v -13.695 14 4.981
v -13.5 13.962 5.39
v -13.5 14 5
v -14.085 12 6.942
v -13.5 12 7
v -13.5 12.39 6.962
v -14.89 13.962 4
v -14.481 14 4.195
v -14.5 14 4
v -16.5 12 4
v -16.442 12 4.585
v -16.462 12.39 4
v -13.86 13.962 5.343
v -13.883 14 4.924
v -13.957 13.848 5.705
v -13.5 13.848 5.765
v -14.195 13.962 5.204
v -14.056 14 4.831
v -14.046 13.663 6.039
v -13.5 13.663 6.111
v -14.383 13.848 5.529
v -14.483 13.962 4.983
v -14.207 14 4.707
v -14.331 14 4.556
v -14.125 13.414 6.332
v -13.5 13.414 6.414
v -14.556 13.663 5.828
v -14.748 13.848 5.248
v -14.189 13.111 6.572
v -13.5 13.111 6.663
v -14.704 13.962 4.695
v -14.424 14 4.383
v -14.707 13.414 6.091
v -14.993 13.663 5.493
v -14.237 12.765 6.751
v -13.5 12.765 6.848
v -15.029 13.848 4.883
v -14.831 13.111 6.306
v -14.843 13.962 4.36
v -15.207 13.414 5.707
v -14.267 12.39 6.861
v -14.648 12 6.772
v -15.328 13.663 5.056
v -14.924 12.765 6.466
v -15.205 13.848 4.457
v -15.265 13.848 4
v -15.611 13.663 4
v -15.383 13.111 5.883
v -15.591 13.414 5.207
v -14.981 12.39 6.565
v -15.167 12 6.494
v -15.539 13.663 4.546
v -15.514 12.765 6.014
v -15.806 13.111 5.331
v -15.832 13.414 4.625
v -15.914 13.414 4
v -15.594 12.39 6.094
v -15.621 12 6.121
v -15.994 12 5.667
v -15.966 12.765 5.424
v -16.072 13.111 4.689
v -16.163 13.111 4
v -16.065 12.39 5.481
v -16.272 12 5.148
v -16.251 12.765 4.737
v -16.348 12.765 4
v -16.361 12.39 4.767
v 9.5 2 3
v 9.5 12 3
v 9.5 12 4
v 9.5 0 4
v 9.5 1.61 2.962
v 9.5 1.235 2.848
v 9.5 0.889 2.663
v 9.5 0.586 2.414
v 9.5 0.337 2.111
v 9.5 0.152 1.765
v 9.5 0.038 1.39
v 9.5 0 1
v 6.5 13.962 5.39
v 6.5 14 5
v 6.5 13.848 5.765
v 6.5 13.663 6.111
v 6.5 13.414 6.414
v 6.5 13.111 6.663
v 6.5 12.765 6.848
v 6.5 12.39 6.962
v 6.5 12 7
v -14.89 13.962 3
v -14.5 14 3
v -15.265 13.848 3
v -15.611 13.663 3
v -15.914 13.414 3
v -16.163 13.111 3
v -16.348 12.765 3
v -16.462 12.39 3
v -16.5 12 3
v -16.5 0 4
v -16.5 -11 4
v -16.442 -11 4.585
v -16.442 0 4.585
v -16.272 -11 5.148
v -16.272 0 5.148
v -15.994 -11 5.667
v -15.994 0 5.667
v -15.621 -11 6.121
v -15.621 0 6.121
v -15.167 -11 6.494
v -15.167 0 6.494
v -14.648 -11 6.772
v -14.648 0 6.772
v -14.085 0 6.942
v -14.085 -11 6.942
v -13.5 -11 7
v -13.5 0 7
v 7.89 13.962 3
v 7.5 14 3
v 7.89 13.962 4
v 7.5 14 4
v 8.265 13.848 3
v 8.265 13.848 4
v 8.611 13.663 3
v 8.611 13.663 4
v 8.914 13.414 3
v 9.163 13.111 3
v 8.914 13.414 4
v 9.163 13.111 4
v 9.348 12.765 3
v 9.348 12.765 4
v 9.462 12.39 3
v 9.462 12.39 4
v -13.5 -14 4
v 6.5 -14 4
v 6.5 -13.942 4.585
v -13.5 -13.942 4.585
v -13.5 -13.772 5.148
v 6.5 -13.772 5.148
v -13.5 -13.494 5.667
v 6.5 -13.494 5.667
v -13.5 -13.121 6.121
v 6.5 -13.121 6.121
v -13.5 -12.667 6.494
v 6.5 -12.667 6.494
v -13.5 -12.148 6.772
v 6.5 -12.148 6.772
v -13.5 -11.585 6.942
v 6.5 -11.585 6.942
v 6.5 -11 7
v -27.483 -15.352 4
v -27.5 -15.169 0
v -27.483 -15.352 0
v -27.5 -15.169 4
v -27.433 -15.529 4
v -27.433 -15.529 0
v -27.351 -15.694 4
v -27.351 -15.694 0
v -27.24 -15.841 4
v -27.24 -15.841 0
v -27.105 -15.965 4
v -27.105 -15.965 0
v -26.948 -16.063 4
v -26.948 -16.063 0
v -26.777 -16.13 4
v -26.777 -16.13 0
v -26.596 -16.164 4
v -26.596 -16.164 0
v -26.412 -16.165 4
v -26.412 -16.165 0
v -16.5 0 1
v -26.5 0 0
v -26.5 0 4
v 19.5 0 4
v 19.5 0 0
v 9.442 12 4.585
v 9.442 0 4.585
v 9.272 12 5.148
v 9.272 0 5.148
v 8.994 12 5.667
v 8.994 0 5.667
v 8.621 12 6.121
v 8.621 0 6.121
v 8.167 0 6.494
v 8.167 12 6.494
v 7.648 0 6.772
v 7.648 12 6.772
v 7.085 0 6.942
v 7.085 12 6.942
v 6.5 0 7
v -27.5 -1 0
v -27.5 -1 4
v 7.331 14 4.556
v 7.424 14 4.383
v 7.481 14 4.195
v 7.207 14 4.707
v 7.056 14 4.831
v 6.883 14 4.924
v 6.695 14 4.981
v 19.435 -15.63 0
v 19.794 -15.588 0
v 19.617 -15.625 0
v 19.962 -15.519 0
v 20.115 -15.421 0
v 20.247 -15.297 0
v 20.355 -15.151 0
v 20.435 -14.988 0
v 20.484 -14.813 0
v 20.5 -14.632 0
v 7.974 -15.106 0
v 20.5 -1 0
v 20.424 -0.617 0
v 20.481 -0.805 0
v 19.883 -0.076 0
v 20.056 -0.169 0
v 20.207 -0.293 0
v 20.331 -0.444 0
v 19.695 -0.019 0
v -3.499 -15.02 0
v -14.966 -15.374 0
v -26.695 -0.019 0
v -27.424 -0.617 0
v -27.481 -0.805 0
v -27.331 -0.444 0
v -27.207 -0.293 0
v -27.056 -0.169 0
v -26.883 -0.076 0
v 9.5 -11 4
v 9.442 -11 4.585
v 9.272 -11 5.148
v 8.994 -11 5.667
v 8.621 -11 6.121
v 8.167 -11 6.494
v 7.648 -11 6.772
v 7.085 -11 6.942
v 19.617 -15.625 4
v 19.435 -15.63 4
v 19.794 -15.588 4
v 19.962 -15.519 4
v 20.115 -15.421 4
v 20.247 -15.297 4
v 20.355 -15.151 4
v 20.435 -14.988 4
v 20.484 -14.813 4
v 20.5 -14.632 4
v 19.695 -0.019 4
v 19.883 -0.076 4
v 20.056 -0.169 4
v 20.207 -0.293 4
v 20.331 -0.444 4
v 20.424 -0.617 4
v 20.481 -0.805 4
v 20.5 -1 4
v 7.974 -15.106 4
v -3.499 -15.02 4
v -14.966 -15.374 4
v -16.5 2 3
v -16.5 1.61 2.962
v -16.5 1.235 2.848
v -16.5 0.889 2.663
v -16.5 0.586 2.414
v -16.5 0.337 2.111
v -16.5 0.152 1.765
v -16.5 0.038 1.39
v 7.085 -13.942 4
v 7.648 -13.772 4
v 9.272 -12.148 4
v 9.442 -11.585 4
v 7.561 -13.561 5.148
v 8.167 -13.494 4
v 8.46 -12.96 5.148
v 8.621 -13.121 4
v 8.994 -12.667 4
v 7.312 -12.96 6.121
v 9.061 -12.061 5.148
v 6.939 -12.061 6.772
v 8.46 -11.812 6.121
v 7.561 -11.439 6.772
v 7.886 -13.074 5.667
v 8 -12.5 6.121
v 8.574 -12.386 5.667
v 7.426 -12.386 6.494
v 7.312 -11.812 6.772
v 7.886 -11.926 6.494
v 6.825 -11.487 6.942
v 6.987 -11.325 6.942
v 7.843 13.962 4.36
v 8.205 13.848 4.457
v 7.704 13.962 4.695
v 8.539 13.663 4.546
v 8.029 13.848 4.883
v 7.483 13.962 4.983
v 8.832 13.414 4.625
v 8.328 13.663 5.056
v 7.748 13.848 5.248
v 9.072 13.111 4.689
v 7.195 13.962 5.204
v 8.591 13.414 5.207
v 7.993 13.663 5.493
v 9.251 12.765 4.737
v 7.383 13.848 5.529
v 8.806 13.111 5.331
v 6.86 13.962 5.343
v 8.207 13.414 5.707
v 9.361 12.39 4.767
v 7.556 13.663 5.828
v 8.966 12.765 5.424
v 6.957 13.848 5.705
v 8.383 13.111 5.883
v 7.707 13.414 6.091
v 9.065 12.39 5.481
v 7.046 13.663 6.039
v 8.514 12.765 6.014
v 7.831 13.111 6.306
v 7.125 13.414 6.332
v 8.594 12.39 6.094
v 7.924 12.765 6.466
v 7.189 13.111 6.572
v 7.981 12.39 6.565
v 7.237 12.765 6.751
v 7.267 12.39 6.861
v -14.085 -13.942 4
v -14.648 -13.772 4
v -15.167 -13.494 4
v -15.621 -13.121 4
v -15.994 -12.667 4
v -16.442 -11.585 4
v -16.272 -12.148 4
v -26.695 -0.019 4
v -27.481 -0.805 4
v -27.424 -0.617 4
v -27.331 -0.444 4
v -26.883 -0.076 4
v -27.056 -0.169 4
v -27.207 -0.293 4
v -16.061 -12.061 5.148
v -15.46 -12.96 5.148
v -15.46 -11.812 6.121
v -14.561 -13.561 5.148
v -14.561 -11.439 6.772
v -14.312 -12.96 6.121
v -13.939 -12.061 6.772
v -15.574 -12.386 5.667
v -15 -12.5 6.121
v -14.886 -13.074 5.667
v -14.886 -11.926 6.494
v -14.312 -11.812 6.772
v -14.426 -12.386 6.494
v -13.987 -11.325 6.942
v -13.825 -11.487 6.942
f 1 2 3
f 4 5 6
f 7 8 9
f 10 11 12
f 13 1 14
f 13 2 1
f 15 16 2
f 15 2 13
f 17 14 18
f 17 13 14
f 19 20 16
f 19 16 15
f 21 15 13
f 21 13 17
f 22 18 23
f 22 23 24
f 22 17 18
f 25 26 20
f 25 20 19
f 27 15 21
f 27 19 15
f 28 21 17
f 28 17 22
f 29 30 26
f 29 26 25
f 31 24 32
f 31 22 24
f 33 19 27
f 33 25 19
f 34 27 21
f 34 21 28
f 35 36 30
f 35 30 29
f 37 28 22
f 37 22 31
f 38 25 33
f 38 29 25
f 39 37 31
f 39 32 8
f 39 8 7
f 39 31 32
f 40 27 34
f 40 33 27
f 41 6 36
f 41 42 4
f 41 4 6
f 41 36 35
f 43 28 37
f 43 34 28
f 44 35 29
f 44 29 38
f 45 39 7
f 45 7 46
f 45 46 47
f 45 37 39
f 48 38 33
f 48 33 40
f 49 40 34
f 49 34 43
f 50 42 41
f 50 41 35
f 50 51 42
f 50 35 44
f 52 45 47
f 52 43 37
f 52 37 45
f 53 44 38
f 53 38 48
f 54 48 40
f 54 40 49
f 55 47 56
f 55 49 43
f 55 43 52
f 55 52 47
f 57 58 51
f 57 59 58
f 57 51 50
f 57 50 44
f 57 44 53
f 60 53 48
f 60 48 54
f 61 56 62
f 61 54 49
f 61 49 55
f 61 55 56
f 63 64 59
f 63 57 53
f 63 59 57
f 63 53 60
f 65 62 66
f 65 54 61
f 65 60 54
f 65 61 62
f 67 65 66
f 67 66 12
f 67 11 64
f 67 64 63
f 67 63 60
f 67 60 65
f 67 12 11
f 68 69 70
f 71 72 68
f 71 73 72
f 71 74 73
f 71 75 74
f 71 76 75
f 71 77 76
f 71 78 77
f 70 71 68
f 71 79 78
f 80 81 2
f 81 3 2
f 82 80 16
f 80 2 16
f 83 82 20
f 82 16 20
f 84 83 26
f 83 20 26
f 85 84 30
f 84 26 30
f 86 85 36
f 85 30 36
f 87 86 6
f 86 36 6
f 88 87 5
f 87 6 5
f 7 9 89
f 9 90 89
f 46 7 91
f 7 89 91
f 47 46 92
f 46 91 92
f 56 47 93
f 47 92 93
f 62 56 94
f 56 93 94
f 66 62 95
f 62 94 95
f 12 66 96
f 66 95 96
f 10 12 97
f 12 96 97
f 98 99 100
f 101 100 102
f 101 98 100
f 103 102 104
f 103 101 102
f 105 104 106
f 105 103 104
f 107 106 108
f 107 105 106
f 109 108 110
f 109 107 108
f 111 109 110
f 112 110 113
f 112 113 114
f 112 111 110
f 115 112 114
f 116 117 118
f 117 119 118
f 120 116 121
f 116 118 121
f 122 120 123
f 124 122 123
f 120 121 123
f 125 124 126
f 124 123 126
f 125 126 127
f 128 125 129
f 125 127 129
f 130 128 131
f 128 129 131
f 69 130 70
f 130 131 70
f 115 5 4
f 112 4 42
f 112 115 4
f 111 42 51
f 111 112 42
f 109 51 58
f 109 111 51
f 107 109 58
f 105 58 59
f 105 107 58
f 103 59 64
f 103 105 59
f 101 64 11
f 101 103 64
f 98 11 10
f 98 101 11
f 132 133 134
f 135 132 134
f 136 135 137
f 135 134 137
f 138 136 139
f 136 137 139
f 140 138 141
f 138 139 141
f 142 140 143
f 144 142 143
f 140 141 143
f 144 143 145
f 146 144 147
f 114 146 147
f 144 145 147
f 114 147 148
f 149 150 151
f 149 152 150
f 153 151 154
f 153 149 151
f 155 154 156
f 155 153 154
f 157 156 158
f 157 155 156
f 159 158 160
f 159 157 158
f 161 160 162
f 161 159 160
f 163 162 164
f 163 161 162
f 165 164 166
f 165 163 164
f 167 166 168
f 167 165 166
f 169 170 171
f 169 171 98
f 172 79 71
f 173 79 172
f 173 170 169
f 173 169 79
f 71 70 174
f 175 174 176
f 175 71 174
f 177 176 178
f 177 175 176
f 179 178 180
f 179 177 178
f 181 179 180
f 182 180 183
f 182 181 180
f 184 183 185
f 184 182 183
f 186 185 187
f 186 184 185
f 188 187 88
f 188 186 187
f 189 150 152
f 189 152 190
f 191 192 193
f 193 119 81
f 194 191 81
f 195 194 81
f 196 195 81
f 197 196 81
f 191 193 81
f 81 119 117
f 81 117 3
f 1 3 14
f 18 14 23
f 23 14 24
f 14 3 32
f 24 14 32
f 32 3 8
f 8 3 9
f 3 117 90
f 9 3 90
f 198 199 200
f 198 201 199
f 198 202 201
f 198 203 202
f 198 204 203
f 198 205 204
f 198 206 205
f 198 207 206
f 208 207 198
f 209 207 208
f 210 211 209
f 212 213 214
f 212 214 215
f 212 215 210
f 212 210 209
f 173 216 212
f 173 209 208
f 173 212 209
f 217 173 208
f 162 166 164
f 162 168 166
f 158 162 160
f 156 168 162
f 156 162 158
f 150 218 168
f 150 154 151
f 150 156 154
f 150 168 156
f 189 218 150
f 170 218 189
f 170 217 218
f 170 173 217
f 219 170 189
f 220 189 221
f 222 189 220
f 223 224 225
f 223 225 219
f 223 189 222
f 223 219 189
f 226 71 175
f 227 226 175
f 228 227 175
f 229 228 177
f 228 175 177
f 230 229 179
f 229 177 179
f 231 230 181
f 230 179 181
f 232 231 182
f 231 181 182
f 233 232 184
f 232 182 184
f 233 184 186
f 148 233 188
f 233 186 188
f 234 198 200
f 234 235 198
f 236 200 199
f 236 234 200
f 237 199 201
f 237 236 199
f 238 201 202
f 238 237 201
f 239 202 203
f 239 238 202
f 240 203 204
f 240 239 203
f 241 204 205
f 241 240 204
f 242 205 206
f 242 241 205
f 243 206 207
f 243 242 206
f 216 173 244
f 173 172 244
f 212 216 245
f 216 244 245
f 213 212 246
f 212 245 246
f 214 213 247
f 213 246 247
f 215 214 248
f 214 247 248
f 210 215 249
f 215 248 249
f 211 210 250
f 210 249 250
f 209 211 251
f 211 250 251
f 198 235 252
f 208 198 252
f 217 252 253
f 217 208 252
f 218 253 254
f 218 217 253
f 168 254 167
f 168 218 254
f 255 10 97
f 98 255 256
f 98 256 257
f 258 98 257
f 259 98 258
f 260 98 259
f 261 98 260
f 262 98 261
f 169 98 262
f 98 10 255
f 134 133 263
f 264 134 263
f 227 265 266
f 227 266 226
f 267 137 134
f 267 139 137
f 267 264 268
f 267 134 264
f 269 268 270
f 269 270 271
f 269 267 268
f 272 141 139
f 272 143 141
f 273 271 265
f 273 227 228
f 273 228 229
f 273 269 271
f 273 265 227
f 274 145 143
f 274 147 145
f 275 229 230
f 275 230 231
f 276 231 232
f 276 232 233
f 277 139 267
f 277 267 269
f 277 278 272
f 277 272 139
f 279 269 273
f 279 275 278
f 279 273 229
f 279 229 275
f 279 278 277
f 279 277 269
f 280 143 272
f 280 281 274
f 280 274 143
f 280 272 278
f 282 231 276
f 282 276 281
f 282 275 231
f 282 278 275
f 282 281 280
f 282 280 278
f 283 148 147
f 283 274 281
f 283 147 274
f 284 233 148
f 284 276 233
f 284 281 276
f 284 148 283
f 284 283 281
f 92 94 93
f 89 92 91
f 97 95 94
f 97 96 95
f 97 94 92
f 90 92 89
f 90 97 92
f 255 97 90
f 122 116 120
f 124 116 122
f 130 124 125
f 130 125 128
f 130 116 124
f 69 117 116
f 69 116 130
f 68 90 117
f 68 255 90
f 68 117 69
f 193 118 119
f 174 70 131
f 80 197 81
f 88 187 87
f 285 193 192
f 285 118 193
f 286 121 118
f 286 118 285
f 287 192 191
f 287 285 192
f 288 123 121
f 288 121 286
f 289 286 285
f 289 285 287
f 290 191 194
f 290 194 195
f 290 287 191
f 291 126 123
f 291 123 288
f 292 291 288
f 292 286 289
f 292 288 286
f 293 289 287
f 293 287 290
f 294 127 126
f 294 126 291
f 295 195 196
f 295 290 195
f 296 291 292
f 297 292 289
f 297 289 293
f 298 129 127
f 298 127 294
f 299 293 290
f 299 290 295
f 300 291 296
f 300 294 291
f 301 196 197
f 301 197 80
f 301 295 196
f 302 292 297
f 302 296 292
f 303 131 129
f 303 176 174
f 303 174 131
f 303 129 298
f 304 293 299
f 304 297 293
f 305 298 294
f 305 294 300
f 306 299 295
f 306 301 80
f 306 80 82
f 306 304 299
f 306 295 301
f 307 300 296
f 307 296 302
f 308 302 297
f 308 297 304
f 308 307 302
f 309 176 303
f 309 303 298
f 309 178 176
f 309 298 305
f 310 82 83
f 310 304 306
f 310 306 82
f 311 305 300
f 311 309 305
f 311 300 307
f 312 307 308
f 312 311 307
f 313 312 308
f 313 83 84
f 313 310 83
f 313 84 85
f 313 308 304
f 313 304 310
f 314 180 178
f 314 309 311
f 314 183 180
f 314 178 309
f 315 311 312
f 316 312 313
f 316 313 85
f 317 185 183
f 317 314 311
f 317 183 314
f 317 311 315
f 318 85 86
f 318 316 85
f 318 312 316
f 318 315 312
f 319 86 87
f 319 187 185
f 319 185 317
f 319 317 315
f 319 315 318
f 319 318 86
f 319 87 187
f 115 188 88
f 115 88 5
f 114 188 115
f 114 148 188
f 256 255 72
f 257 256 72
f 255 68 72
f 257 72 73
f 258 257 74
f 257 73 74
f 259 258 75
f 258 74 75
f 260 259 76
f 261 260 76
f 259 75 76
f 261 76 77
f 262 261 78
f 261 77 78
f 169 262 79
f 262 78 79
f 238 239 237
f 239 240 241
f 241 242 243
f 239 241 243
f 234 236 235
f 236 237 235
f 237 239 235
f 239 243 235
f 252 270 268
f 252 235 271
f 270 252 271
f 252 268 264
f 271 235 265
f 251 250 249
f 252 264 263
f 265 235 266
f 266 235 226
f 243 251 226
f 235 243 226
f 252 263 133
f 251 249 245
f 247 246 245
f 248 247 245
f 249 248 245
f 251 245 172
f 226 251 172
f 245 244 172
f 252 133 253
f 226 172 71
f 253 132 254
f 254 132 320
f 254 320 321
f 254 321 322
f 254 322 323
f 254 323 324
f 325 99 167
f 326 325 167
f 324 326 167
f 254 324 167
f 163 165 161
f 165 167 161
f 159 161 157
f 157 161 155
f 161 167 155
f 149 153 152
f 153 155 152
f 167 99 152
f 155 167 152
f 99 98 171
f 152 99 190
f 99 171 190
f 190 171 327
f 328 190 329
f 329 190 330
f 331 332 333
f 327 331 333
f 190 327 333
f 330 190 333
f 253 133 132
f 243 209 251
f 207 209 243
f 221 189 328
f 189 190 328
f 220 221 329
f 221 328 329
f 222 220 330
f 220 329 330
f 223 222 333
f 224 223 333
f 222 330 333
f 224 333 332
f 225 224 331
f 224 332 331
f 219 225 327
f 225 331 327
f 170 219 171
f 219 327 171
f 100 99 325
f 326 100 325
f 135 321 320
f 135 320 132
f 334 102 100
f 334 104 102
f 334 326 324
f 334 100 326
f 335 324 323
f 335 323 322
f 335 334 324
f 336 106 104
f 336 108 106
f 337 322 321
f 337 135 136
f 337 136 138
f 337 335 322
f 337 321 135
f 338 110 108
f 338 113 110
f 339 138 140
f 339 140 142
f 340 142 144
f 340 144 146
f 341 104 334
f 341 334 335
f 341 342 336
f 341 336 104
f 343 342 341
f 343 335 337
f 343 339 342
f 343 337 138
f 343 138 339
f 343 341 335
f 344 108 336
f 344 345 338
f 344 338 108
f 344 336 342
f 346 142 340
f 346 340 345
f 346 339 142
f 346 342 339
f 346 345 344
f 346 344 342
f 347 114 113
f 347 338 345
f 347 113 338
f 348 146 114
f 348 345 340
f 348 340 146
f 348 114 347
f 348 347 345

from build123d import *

# Parameters (mm, degrees)
BOSS_EXTRUDE1_DEPTH = 4
SKETCH4_W           = 26
SKETCH4_H           = 14
BOSS_EXTRUDE2_DEPTH = 3
FILLET1_R           = 1
FILLET3_R           = 3
FILLET4_R           = 3
BOSS_EXTRUDE9_DEPTH = 14
FILLET5_R           = 2
FILLET6_R           = 2


# Some blends are built 0.0001 mm under size
with BuildPart() as part:
    # Sketch1 → Boss-Extrude1 (new body)
    with BuildSketch(Plane(origin=(0, 0, 0), x_dir=(-1, 0, 0), z_dir=(0, 0, -1))):
        with BuildLine():
            Line((27.500000074, -16.263075607), (27.500000074, 0))
            Line((27.500000074, 0), (-20.499999926, 0))
            Line((-20.499999926, 0), (-20.499999926, -15.701236215))
            ThreePointArc((-20.499999926, -15.701236215), (3.511255672, -15.020548898), (27.500000074, -16.263075607))
        make_face()
    extrude(amount=-BOSS_EXTRUDE1_DEPTH)

    # Sketch4 → Boss-Extrude2 (add)
    with BuildSketch(Plane.XY.offset(4)):
        with Locations((-3.500000074, -7)):
            Rectangle(SKETCH4_W, SKETCH4_H)
    extrude(amount=BOSS_EXTRUDE2_DEPTH)

    # Fillet1
    fillet1_edges = [part.edges().sort_by_distance(p)[0] for p in [
        (20.499999926, 0, 2),
        (-27.500000074, 0, 2),
        (20.499999926, -15.701236215, 2),
        (-27.500000074, -16.263075607, 2),
    ]]
    fillet(fillet1_edges, radius=FILLET1_R)

    # Fillet3
    fillet3_edges = [part.edges().sort_by_distance(p)[0] for p in [
        (-3.500000074, -14, 7),
        (-16.500000074, -7, 7),
        (9.499999926, -7, 7),
    ]]
    fillet(fillet3_edges, radius=FILLET3_R - 0.0001)  # a hair under: the kernel refuses the full size

    # Fillet4
    # the kernel refuses this fillet: 3 mm, written as the material it takes off along each edge
    with BuildSketch(Plane(origin=(-13.500000074, -11, 7), x_dir=(-1, 0, 0), z_dir=(0, 1, 0))) as fillet4_piece_1:
        with BuildLine():
            CenterArc((0.0001, -2.9999), 2.9999, 0, 90)
            Line((3, -2.9999), (3, 0))
            Line((3, 0), (0.0001, 0))
        make_face()
    revolve(axis=Axis((-13.500000074, -11, 7), (0, 0, 1)), revolution_arc=90, mode=Mode.SUBTRACT)
    with BuildSketch(Plane(origin=(6.499999926, -11, 7), x_dir=(0, -1, 0), z_dir=(-1, 0, 0))) as fillet4_piece_2:
        with BuildLine():
            CenterArc((0.0001, -2.9999), 2.9999, 0, 90)
            Line((3, -2.9999), (3, 0))
            Line((3, 0), (0.0001, 0))
        make_face()
    revolve(axis=Axis((6.499999926, -11, 7), (0, 0, 1)), revolution_arc=90, mode=Mode.SUBTRACT)
    with BuildSketch(Plane(origin=(9.499999926, -14, 4), x_dir=(0, 1, 0), z_dir=(0, 0, 1))) as fillet4_piece_3:
        with BuildLine():
            CenterArc((FILLET4_R, FILLET4_R), FILLET4_R, 180, 90)
            Line((0, FILLET4_R), (0, 0))
            Line((0, 0), (FILLET4_R, 0))
        make_face()
    extrude(amount=3, mode=Mode.SUBTRACT)
    with BuildSketch(Plane(origin=(-16.500000074, -14, 4), x_dir=(0, 1, 0), z_dir=(0, 0, 1))) as fillet4_piece_4:
        with BuildLine():
            CenterArc((FILLET4_R, -FILLET4_R), FILLET4_R, 90, 90)
            Line((0, -FILLET4_R), (0, 0))
            Line((0, 0), (FILLET4_R, 0))
        make_face()
    extrude(amount=3, mode=Mode.SUBTRACT)

    # Sketch21 → Boss-Extrude9 (add)
    with BuildSketch(Plane(origin=(0, 0, 0), x_dir=(1, 0, 0), z_dir=(0, 1, 0))):
        with BuildLine():
            Line((6.499999926, -7), (-13.500000074, -7))
            ThreePointArc((-13.500000074, -7), (-15.621320417, -6.121320344), (-16.500000074, -4))
            Line((-16.500000074, -4), (-16.500000074, -3))
            Line((-16.500000074, -3), (9.499999926, -3))
            Line((9.499999926, -3), (9.499999926, -4))
            ThreePointArc((9.499999926, -4), (8.62132027, -6.121320344), (6.499999926, -7))
        make_face()
    extrude(amount=BOSS_EXTRUDE9_DEPTH)

    # Fillet5
    fillet5_edges = [part.edges().sort_by_distance(p)[0] for p in [
        (-16.500000074, 14, 3.5),
        (-15.621320417, 14, 6.121320344),
        (9.499999926, 14, 3.5),
        (8.62132027, 14, 6.121320344),
        (-3.500000074, 14, 7),
    ]]
    fillet(fillet5_edges, radius=FILLET5_R)

    # Fillet6
    fillet6_edges = [part.edges().sort_by_distance(p)[0] for p in [
        (-3.500000074, 0, 3),
    ]]
    fillet(fillet6_edges, radius=FILLET6_R)


solid = part.part
